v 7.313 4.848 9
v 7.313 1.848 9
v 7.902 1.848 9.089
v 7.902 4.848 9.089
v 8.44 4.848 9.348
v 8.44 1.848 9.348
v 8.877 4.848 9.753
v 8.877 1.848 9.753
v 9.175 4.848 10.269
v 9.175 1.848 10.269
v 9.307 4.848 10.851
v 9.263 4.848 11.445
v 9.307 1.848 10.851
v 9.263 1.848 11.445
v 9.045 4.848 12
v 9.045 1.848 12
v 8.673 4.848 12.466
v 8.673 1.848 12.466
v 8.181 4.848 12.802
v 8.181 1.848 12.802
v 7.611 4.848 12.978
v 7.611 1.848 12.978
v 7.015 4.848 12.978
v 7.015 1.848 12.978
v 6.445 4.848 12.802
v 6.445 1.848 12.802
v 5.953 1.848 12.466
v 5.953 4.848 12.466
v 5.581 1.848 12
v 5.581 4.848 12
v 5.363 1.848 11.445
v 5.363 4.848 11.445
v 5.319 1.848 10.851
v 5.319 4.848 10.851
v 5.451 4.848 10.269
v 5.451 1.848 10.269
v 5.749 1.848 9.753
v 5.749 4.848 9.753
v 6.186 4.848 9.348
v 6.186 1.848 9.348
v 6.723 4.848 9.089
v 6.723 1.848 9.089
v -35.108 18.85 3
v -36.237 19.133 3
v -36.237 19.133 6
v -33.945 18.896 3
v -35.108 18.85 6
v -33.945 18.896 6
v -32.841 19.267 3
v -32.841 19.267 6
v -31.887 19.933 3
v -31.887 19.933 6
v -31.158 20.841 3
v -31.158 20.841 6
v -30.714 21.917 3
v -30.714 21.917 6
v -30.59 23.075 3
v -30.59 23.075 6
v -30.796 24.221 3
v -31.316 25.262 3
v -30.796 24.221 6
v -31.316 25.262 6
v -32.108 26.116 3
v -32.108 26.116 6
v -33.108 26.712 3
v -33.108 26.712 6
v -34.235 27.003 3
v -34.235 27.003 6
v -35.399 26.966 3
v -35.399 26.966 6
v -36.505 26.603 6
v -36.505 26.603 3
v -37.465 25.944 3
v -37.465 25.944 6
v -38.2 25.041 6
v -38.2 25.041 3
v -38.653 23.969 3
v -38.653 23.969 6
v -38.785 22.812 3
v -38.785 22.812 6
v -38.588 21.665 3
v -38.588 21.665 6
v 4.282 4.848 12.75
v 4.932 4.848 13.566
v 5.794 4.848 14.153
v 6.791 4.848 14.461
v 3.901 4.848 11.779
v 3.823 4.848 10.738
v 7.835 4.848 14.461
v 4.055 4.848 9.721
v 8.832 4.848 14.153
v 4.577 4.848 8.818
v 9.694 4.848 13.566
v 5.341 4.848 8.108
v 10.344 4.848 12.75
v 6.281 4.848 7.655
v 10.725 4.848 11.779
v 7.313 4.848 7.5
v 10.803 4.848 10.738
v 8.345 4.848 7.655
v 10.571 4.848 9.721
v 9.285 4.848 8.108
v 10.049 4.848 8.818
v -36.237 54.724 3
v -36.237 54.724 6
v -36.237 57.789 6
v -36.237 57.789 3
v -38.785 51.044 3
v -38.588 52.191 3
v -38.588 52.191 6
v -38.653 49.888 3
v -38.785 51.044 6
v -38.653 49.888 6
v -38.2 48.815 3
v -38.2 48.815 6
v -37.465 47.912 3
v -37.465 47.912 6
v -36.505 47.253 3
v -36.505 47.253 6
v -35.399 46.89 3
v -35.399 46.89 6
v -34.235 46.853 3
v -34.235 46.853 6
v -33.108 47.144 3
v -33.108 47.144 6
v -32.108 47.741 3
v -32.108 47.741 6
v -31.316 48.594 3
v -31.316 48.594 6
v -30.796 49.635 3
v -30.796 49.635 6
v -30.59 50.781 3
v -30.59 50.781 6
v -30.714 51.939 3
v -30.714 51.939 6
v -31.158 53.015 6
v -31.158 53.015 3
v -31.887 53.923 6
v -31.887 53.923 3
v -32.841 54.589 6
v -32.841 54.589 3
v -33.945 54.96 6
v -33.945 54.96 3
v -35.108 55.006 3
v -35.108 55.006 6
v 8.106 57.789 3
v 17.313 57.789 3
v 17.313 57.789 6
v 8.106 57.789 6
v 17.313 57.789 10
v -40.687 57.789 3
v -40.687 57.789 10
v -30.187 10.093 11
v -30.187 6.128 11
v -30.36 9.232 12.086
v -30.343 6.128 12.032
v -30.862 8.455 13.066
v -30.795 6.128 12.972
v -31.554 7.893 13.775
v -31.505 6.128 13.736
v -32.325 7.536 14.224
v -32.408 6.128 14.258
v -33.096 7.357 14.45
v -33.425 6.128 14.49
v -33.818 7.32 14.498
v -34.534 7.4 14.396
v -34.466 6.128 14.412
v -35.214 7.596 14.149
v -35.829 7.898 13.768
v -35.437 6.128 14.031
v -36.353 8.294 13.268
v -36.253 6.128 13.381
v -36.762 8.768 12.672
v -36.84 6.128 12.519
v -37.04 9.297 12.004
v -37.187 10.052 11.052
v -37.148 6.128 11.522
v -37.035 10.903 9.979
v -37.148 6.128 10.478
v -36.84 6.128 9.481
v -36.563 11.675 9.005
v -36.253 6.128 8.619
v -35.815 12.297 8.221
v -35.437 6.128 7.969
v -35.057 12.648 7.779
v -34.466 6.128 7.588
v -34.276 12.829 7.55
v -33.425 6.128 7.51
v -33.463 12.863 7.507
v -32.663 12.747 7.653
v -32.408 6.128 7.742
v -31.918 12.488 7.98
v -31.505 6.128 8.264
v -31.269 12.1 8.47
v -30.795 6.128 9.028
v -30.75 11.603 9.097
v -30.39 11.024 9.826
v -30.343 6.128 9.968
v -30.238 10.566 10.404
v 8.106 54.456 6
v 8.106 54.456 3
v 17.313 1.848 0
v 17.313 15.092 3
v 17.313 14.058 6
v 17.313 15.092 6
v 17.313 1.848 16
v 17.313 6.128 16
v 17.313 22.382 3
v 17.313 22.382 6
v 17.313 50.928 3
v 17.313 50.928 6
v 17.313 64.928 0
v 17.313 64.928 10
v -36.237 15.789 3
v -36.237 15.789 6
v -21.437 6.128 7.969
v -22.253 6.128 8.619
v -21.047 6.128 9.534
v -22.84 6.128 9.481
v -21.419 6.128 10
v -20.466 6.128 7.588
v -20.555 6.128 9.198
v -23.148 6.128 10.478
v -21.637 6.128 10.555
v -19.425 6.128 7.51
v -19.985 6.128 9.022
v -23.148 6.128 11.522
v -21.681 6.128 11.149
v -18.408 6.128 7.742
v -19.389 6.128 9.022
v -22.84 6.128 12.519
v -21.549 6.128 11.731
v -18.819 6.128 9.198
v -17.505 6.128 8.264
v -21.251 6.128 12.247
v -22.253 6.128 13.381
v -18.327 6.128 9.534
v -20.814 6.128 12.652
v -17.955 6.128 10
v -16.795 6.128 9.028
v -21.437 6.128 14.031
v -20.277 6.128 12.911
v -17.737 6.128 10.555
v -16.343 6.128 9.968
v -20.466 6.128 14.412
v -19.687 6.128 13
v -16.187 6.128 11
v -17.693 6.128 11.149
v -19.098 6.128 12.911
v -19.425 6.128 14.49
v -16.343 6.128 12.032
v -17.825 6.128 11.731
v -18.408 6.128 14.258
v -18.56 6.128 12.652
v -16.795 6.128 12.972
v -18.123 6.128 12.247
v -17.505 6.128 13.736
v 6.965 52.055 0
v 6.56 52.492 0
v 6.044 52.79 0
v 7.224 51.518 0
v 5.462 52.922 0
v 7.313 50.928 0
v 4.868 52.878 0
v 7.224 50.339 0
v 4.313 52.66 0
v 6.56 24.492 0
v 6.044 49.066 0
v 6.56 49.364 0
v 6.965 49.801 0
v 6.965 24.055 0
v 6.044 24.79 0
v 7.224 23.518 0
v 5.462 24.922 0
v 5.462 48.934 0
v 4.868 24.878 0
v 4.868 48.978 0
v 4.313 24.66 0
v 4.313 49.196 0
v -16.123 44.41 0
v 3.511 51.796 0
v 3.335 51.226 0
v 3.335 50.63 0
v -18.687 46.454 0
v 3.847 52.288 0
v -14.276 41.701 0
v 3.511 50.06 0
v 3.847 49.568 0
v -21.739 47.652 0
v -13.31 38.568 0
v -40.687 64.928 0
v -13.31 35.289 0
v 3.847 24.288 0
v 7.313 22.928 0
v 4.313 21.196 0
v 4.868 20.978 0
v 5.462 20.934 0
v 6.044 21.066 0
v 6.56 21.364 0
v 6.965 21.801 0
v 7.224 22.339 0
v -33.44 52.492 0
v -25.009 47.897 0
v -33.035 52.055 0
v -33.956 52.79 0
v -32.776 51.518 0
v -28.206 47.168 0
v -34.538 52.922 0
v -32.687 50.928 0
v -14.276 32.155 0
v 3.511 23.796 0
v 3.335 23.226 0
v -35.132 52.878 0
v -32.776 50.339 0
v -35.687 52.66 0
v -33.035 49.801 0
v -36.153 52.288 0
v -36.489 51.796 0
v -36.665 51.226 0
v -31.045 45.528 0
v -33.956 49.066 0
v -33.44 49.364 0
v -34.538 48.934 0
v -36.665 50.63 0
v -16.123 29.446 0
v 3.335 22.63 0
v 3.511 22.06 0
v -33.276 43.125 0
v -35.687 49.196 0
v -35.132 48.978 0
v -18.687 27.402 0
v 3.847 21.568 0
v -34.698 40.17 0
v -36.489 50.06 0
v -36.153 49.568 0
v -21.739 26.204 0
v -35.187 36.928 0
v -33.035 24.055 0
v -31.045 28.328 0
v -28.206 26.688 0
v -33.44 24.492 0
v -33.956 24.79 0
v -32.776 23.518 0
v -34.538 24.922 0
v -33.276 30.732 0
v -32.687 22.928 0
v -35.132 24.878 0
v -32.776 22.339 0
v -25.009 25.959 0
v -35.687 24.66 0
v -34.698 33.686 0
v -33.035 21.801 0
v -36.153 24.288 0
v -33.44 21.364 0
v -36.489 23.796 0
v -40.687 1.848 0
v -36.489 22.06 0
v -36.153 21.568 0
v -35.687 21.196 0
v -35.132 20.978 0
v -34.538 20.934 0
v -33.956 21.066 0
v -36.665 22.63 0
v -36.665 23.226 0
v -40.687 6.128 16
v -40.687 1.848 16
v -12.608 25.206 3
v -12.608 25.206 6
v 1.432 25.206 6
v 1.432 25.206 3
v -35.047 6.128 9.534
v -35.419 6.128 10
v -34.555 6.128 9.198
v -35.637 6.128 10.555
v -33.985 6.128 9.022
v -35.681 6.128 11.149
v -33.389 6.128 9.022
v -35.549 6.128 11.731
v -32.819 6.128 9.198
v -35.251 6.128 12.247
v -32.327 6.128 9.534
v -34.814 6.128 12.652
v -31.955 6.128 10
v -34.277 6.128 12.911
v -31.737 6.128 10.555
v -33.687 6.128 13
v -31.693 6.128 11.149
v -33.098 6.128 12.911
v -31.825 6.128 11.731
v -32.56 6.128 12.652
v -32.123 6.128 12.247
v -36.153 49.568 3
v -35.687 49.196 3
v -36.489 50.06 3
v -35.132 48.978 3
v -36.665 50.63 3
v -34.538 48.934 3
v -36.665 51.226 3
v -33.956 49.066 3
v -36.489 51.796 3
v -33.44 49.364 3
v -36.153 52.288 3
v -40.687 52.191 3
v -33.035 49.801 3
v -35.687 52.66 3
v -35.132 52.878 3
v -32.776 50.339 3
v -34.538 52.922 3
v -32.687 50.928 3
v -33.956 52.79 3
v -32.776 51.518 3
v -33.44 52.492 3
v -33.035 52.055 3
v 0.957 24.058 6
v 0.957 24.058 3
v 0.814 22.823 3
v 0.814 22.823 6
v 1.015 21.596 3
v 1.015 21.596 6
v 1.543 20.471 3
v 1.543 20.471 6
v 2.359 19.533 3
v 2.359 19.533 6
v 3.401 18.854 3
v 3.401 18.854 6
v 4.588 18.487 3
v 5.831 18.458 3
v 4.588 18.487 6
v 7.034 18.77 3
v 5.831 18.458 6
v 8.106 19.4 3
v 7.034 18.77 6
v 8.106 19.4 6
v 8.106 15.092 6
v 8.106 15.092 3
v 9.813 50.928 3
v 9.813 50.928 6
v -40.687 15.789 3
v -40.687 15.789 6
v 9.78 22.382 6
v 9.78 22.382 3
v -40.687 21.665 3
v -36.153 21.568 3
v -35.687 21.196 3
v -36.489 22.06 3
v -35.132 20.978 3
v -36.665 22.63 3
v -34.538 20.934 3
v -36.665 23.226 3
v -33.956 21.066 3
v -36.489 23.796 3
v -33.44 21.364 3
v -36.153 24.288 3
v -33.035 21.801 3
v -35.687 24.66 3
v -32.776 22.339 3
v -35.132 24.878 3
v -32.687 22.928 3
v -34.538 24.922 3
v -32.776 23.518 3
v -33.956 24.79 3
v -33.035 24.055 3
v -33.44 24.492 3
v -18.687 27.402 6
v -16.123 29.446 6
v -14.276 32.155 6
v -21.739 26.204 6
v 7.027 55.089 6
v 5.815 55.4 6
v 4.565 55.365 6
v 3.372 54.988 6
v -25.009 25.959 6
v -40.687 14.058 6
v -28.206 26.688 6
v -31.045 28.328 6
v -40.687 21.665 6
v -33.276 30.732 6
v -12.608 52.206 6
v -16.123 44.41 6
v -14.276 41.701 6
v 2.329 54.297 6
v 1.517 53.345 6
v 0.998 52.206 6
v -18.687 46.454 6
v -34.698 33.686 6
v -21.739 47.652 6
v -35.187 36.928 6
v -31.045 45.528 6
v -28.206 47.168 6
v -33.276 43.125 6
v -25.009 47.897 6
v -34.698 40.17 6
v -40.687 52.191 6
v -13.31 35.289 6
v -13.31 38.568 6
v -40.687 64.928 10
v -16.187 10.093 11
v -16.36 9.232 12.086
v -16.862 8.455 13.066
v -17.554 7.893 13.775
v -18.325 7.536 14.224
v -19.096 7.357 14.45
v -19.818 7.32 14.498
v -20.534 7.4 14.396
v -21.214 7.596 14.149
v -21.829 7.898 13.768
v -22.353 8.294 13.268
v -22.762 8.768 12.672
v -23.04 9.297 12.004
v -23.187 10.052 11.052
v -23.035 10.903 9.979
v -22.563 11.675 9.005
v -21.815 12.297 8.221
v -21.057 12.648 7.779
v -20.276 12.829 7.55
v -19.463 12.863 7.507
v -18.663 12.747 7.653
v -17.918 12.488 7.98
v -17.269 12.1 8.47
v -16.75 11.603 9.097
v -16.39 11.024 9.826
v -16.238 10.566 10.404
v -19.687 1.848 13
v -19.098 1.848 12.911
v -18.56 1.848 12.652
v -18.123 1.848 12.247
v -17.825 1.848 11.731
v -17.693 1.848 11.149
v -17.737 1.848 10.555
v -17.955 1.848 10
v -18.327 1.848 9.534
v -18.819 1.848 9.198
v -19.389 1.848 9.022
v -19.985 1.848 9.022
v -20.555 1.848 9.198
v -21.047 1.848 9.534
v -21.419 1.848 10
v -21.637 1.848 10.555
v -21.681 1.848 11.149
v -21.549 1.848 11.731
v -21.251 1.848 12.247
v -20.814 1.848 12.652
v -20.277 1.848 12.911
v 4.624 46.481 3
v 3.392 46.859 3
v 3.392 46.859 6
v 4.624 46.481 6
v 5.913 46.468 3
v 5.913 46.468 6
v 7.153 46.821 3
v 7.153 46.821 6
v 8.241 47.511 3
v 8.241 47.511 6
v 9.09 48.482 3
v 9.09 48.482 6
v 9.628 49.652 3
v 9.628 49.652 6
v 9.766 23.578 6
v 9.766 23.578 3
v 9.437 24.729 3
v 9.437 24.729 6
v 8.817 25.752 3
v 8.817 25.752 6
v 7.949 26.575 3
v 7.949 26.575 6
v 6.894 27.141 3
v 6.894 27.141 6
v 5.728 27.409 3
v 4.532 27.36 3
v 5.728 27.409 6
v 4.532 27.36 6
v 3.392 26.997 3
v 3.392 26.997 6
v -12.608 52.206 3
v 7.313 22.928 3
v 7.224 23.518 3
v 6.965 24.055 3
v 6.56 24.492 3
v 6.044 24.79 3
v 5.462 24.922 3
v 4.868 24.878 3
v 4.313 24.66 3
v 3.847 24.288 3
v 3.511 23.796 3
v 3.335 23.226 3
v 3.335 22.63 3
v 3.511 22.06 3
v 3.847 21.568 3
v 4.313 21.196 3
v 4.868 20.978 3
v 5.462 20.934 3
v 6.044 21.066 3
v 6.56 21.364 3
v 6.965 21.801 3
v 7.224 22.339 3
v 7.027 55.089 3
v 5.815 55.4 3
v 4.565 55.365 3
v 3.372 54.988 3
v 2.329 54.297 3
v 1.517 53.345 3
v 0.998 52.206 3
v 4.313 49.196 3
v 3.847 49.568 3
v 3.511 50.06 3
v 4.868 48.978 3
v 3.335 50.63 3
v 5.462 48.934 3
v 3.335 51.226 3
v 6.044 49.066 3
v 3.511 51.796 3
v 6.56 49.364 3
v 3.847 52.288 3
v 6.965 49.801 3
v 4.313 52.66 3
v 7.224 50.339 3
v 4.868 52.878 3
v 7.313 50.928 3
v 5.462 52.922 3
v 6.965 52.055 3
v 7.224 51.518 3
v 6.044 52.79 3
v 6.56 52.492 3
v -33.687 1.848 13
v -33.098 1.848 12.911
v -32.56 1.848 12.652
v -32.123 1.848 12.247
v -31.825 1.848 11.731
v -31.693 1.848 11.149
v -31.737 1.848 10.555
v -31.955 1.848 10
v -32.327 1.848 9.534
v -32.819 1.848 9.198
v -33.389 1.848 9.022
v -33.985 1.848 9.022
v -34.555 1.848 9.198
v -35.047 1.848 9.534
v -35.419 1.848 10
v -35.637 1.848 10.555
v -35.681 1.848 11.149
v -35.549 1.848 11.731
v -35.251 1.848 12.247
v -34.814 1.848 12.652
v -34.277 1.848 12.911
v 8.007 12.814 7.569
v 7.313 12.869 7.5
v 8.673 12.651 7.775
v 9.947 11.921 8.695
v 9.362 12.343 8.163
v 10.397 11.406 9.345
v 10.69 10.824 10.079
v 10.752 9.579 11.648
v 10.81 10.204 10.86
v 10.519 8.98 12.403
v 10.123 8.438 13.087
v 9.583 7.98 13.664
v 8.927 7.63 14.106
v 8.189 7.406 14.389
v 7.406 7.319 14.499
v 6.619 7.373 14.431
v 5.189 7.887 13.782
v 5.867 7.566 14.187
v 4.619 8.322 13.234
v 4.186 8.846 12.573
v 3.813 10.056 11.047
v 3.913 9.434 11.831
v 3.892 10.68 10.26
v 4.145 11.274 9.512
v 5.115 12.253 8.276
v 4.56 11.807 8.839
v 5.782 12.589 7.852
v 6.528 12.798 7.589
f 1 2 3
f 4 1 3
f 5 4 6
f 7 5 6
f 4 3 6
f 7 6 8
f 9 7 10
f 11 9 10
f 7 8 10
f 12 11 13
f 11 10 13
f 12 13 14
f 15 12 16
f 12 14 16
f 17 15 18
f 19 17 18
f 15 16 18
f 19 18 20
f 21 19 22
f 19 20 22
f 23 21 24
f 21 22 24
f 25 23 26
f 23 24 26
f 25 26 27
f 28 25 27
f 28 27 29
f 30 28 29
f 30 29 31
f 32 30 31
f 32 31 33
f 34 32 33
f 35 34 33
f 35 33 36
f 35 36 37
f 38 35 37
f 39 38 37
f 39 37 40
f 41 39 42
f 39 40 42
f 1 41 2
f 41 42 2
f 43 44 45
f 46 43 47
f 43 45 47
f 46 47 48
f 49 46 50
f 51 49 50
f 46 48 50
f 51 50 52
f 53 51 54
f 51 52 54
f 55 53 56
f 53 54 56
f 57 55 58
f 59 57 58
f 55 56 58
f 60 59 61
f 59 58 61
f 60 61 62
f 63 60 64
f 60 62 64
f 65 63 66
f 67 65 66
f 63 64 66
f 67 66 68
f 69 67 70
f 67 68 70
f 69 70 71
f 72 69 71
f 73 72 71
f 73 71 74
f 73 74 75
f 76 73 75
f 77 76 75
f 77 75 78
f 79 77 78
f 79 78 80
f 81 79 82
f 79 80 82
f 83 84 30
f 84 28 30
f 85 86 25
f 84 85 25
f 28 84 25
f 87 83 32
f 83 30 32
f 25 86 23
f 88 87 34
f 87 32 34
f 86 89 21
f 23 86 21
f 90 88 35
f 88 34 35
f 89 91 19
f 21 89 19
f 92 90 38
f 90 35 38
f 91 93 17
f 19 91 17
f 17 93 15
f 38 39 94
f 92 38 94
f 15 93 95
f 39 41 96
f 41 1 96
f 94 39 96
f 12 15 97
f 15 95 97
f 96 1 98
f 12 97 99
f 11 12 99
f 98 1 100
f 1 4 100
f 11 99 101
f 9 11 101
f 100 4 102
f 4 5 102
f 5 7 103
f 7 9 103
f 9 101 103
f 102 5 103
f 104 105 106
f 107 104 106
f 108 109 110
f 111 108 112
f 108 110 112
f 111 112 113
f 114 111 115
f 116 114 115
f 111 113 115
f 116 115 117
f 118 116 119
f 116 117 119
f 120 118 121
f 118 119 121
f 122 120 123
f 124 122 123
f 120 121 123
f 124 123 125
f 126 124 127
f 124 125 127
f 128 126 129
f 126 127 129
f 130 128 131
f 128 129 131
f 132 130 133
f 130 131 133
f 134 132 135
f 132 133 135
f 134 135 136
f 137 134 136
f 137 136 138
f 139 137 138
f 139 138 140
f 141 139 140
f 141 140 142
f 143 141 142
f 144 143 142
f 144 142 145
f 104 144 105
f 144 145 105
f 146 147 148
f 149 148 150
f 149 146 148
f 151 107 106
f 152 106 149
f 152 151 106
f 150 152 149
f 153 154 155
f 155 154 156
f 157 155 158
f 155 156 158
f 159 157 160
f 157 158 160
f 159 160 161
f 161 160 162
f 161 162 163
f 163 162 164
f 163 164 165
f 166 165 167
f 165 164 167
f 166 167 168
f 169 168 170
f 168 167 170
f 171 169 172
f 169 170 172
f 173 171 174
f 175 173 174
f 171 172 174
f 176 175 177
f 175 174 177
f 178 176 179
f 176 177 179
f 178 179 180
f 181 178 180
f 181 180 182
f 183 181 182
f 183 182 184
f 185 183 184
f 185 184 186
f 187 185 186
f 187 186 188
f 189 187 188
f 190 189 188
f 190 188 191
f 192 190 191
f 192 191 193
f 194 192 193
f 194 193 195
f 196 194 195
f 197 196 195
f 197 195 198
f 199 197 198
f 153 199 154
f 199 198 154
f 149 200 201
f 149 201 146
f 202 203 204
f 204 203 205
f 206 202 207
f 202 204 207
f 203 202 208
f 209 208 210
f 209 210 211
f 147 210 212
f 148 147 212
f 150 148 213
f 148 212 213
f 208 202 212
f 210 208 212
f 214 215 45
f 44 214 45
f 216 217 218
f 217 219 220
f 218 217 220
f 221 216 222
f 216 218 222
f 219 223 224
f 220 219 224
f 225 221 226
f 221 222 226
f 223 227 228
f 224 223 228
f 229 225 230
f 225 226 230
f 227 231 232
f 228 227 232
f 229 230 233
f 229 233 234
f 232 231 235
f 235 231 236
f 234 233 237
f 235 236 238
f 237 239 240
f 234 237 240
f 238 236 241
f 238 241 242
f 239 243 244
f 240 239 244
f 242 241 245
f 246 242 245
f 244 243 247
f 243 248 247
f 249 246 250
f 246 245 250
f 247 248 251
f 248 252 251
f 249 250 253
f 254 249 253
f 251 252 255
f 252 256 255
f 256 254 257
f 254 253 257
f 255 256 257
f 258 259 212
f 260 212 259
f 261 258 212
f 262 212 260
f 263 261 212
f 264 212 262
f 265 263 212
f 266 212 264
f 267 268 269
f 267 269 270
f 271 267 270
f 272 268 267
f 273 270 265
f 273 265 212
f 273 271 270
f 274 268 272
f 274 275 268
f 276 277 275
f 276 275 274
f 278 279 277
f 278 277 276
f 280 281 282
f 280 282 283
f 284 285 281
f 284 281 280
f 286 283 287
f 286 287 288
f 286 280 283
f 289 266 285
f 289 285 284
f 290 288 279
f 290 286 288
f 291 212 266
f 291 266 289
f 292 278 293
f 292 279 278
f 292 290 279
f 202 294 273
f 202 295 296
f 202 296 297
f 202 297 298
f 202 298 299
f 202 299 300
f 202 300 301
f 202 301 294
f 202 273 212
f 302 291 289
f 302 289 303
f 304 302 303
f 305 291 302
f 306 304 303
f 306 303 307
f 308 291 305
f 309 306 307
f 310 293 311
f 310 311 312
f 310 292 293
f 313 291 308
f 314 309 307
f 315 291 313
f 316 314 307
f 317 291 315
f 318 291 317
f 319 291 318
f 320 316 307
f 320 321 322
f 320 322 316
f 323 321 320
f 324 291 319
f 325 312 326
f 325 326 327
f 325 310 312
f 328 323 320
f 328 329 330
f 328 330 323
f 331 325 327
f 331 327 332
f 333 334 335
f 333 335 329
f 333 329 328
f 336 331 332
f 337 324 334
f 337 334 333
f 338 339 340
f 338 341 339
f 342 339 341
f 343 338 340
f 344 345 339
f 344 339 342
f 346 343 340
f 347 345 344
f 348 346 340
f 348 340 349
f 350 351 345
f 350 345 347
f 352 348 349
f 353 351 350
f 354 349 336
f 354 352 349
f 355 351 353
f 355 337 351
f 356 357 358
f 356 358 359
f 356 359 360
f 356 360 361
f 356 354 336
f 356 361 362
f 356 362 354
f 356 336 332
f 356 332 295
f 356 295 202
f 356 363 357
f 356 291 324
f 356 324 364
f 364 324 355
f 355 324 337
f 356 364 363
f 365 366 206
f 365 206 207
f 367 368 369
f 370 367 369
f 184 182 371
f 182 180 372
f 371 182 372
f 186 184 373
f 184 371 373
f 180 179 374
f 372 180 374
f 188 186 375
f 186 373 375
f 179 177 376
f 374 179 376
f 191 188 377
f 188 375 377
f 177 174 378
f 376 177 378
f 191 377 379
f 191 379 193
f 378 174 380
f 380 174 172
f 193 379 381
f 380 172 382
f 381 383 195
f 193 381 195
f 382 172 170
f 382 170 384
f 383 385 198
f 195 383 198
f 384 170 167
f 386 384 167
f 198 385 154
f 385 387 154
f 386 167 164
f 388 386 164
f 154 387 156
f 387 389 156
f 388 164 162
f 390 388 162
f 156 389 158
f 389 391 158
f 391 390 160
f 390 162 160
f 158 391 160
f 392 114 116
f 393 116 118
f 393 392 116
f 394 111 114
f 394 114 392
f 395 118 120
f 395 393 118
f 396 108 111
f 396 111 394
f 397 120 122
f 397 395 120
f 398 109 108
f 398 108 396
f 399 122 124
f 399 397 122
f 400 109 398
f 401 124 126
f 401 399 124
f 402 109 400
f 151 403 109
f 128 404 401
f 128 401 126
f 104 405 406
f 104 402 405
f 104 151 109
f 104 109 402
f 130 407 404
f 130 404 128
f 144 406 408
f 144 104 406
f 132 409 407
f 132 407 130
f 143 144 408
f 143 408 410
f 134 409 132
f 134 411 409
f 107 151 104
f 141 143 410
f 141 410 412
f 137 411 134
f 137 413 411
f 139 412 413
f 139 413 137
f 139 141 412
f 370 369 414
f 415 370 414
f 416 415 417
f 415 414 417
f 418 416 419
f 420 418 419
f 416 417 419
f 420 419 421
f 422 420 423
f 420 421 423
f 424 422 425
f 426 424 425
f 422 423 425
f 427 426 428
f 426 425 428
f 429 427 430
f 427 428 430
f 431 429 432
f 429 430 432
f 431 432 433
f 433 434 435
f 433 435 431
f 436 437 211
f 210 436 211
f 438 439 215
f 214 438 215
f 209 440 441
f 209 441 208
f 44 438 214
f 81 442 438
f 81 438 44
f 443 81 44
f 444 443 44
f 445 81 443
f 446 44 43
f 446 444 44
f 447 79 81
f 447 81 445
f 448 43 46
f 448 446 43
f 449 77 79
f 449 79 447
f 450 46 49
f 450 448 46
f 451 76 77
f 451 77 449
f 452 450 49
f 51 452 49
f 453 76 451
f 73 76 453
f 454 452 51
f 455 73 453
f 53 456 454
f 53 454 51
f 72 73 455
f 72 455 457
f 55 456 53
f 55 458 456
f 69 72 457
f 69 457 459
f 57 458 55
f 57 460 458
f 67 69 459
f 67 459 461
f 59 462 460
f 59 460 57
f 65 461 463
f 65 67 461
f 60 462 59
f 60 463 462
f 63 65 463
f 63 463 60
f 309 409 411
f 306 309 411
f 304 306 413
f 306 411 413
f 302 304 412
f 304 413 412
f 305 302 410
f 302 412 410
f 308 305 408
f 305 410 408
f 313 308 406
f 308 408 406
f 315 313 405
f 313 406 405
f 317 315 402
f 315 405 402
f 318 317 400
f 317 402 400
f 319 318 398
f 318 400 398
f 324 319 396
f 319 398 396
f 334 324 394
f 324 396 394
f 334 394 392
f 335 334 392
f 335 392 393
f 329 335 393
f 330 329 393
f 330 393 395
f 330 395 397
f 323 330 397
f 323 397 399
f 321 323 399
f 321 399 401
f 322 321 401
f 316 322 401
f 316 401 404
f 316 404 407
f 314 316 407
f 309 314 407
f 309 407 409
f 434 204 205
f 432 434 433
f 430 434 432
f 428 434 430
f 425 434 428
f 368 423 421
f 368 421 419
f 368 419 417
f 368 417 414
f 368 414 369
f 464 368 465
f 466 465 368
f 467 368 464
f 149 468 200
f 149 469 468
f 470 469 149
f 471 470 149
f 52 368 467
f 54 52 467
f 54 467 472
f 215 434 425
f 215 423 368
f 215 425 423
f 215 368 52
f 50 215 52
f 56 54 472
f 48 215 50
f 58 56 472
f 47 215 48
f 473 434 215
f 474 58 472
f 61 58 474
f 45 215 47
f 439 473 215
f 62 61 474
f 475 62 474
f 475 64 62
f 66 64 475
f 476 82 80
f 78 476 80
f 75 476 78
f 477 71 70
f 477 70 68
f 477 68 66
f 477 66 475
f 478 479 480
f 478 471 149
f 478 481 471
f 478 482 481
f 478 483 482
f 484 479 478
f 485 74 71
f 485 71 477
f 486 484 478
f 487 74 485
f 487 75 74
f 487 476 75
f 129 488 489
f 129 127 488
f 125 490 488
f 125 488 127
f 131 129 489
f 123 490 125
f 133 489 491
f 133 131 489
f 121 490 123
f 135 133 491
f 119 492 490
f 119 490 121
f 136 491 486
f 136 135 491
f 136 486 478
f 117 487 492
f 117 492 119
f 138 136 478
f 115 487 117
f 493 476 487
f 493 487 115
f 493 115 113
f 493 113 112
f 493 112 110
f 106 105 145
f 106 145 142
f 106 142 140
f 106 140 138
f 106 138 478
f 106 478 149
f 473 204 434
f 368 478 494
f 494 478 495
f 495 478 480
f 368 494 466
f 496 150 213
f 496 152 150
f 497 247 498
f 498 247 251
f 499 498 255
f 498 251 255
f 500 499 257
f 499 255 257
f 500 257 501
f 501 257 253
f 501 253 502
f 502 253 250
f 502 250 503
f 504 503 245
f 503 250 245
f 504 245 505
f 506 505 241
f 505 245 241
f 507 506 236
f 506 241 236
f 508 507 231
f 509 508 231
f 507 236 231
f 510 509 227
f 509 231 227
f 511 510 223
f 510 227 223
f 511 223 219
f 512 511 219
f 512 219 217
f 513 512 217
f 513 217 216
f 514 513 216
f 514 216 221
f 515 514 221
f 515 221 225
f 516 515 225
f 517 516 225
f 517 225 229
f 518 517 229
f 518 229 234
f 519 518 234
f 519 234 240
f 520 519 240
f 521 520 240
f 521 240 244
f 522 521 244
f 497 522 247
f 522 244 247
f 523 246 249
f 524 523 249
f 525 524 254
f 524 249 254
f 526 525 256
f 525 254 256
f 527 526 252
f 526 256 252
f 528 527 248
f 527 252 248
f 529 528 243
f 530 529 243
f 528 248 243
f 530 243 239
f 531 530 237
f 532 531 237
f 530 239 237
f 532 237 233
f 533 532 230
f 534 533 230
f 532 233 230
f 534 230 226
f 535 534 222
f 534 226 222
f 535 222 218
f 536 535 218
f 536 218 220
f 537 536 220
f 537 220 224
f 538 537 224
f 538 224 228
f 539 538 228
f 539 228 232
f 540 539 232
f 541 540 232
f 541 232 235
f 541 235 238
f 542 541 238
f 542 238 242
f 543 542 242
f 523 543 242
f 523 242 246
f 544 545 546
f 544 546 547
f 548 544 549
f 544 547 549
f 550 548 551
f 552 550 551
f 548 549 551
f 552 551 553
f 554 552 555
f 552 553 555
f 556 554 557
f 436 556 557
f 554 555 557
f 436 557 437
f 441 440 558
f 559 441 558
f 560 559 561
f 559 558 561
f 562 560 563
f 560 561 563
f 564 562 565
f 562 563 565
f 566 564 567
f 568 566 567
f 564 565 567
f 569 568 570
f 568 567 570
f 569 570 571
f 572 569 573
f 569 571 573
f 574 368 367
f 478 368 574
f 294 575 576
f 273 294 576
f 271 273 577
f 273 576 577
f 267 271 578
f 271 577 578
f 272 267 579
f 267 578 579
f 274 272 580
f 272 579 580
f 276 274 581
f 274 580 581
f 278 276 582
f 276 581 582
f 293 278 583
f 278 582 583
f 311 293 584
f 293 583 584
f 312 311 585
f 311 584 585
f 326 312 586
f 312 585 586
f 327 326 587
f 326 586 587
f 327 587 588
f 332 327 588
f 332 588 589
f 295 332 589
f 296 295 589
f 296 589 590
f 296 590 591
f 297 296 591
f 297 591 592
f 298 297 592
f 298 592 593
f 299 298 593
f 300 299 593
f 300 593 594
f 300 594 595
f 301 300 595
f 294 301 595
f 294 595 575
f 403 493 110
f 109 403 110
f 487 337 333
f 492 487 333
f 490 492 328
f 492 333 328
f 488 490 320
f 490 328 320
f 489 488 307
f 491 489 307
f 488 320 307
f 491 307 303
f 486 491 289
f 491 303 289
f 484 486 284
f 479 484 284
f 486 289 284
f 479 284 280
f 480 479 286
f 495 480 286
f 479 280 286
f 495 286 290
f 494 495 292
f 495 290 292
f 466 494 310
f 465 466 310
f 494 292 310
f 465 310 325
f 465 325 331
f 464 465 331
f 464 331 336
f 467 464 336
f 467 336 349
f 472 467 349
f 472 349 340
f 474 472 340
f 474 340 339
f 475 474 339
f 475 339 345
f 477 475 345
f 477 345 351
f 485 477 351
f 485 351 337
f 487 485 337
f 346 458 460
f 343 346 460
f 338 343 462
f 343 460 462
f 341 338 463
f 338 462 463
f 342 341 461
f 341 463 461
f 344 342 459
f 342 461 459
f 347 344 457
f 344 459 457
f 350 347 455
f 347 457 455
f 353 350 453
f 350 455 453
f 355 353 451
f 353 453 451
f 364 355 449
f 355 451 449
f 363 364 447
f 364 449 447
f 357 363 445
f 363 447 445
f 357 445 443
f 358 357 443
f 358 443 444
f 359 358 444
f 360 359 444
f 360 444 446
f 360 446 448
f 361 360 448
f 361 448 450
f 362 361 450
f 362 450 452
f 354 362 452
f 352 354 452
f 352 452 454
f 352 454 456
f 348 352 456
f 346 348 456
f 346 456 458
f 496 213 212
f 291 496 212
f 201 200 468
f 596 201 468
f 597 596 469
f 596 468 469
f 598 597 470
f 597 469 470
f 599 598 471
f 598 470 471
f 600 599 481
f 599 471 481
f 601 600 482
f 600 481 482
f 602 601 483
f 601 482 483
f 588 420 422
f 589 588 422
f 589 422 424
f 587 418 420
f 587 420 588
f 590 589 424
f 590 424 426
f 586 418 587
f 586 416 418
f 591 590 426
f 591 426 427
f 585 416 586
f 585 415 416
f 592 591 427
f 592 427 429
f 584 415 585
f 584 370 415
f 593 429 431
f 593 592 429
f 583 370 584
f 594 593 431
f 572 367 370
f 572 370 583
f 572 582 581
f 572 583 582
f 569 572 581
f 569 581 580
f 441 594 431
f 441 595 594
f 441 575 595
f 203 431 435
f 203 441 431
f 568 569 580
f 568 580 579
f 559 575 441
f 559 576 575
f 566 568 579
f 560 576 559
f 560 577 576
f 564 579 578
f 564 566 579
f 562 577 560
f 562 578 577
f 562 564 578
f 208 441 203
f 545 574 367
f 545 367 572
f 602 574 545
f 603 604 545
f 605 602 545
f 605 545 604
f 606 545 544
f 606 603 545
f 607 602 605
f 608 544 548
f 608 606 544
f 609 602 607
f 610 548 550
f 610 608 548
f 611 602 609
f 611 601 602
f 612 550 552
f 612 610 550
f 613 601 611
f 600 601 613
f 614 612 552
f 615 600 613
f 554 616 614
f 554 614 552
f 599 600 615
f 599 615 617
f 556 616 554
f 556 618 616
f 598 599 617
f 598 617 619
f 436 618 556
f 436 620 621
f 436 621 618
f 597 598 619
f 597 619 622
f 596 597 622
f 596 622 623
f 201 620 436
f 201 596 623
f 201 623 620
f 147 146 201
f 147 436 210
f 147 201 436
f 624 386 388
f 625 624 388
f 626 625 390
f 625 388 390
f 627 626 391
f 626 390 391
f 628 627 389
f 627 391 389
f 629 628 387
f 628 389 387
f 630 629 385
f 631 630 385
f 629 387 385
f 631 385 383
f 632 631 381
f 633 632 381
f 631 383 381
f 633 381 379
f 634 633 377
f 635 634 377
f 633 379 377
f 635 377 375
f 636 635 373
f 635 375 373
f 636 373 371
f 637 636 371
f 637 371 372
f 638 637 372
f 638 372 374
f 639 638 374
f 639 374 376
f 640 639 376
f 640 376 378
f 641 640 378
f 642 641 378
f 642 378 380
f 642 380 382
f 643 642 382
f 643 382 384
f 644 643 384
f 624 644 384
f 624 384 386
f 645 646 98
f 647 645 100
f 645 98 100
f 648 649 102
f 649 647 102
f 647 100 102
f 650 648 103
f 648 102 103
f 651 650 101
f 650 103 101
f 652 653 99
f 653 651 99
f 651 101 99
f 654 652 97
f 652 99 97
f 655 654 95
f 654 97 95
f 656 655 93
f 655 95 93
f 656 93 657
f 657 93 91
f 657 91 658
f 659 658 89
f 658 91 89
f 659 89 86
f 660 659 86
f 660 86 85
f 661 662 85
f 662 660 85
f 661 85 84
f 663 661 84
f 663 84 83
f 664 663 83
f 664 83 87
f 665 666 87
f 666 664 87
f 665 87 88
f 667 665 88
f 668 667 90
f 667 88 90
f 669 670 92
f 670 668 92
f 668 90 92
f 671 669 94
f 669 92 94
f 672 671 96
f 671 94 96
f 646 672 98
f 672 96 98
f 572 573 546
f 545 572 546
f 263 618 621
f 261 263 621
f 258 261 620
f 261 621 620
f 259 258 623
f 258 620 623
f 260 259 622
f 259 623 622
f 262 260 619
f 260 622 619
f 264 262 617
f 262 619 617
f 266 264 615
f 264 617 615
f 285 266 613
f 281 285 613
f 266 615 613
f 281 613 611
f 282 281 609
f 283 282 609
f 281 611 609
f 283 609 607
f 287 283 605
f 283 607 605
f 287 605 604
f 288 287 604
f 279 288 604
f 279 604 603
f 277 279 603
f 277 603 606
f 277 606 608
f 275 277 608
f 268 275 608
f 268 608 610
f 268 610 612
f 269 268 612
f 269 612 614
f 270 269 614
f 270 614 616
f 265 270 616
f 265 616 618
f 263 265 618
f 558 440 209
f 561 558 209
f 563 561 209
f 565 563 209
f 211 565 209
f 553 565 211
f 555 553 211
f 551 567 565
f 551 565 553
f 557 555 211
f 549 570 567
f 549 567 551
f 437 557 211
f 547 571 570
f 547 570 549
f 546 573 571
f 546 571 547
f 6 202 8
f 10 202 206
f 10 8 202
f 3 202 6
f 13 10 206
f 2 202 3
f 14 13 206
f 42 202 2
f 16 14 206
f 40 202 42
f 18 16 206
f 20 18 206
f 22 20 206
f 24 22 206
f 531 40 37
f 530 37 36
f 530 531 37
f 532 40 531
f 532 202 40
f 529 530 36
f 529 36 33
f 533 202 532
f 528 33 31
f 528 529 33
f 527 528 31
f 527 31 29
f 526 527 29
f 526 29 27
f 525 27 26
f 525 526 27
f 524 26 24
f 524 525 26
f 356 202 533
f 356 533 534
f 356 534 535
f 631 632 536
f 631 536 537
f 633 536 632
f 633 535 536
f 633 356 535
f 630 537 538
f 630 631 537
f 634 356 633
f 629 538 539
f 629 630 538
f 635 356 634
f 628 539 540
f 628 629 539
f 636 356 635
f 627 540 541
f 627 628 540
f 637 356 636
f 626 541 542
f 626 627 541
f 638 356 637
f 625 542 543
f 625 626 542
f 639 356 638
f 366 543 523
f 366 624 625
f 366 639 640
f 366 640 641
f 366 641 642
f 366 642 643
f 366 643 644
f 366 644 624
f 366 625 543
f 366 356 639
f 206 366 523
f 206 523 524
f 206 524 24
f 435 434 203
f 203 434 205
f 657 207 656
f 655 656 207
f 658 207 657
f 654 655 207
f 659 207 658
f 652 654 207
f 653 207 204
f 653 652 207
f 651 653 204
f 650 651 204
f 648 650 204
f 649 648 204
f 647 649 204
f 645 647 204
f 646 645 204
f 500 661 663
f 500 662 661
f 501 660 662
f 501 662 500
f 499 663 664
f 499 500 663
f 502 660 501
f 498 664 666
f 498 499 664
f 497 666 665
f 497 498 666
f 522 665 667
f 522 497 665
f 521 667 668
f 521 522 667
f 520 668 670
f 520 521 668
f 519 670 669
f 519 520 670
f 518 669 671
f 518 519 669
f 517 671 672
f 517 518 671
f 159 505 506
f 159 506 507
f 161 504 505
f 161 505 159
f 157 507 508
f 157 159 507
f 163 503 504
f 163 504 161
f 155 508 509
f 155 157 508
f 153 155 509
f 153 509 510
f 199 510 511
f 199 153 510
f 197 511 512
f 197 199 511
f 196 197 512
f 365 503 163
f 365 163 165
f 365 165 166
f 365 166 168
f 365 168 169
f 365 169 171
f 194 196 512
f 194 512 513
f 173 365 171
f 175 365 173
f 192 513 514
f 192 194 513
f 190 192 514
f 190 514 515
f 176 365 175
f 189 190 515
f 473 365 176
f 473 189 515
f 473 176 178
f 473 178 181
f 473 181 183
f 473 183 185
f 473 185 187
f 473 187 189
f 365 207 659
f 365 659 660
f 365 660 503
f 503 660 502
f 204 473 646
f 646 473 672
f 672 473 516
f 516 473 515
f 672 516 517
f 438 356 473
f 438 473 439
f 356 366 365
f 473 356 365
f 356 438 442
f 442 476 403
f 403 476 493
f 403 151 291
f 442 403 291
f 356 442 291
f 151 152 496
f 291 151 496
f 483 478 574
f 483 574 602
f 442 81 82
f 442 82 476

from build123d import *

# Parameters (mm, degrees)
SKETCH1_W            = 93
SKETCH1_H            = 100
BOSS_EXTRUDE2_DEPTH  = 10
SKETCH4_W            = 10.01
SKETCH4_H            = 15
BOSS_EXTRUDE4_DEPTH  = 24
SKETCH5_R            = 2
CUT_EXTRUDE1_DEPTH   = 50
SKETCH7_R            = 11
CUT_EXTRUDE3_DEPTH   = 50
SKETCH14_W           = 61.5
SKETCH14_H           = 42
CUT_EXTRUDE8_DEPTH   = 4
SKETCH19_R           = 11
CUT_EXTRUDE11_DEPTH  = 15
SKETCH20_R           = 2
CUT_EXTRUDE12_DEPTH  = 10
SKETCH21_W           = 40
SKETCH21_H           = 6
BOSS_EXTRUDE5_DEPTH  = 27
SKETCH22_W           = 40
SKETCH22_H           = 6.3
BOSS_EXTRUDE7_DEPTH  = 40
SKETCH23_R           = 8
CUT_EXTRUDE13_DEPTH  = 40
SKETCH24_W           = 118.277817783
SKETCH24_H           = 41.8
CUT_EXTRUDE14_DEPTH  = 40
SKETCH25_W           = 31.5
SKETCH25_H           = 23.2
CUT_EXTRUDE15_DEPTH  = 20
CUT_EXTRUDE18_DEPTH  = 3
SKETCH27_R           = 4.1
SKETCH27_R_2         = 4
CUT_EXTRUDE29_DEPTH  = 3
SKETCH28_W           = 29.5
SKETCH28_H           = 58.2
CUT_EXTRUDE30_DEPTH  = 23
SKETCH29_W           = 32
SKETCH29_H           = 4
CUT_EXTRUDE31_DEPTH  = 23
SKETCH31_W           = 32
SKETCH31_H           = 6
BOSS_EXTRUDE9_DEPTH  = 6.6
SKETCH32_W           = 32
SKETCH32_H           = 6
BOSS_EXTRUDE10_DEPTH = 10
SKETCH33_R           = 2
CUT_EXTRUDE32_DEPTH  = 10
BOSS_EXTRUDE11_START = -32
BOSS_EXTRUDE11_DEPTH = 32
SKETCH35_R           = 3.5
CUT_EXTRUDE33_DEPTH  = 10
SKETCH36_W           = 27
SKETCH36_H           = 46
CUT_EXTRUDE34_DEPTH  = 50
SKETCH38_W           = 31.75
SKETCH38_H           = 35
CUT_EXTRUDE35_DEPTH  = 50
SKETCH40_W           = 4
SKETCH40_H           = 77.818306413
CUT_EXTRUDE37_DEPTH  = 110
SKETCH41_W           = 28
SKETCH41_H           = 1.72
CUT_EXTRUDE38_DEPTH  = 50
BOSS_EXTRUDE12_DEPTH = 30
SKETCH43_R           = 2
CUT_EXTRUDE39_DEPTH  = 30
SKETCH44_R           = 4.5
CUT_EXTRUDE40_DEPTH  = 3
SKETCH45_W           = 9.206702729
SKETCH45_H           = 6.861074725
SKETCH45_H_2         = 7.289433521
CUT_EXTRUDE41_DEPTH  = 3
SKETCH46_W           = 16
SKETCH46_H           = 27
CUT_EXTRUDE42_DEPTH  = 3
SKETCH47_R           = 2
CUT_EXTRUDE43_DEPTH  = 3
SKETCH48_R           = 3.5
CUT_EXTRUDE44_DEPTH  = 23


with BuildPart() as part:
    # Sketch1 → Boss-Extrude2 (new body)
    with BuildSketch(Plane.XY):
        with Locations((-29.68705036, 14.928057554)):
            Rectangle(SKETCH1_W, SKETCH1_H)
    extrude(amount=BOSS_EXTRUDE2_DEPTH)

    # Sketch4 → Boss-Extrude4 (add)
    with BuildSketch(Plane(origin=(16.81294964, 0, 0), x_dir=(0, 0, -1), z_dir=(1, 0, 0))):
        with Locations((-4.995, -12.571942446)):
            Rectangle(SKETCH4_W, SKETCH4_H)
    extrude(amount=BOSS_EXTRUDE4_DEPTH)

    # Sketch5 → Cut-Extrude1 (cut)
    with BuildSketch(Plane(origin=(0, -5.071942446, 0), x_dir=(1, 0, 0), z_dir=(0, 1, 0))):
        with Locations(Location((26.81294964, -5, 0), (0, 0, 180))):
            Circle(SKETCH5_R)
    extrude(amount=-CUT_EXTRUDE1_DEPTH, mode=Mode.SUBTRACT)

    # Sketch7 → Cut-Extrude3 (cut)
    with BuildSketch(Plane(origin=(0, 0, 0), x_dir=(-1, 0, 0), z_dir=(0, 0, -1))):
        with Locations((24.18705036, 36.928057554)):
            Circle(SKETCH7_R)
    extrude(amount=-CUT_EXTRUDE3_DEPTH, mode=Mode.SUBTRACT)

    # Sketch14 → Cut-Extrude8 (cut)
    with BuildSketch(Plane.XY.offset(10)):
        with Locations((-13.93705036, 36.789132279)):
            Rectangle(SKETCH14_W, SKETCH14_H)
    extrude(amount=-CUT_EXTRUDE8_DEPTH, mode=Mode.SUBTRACT)

    # Sketch19 → Cut-Extrude11 (cut)
    with BuildSketch(Plane(origin=(0, 0, 0), x_dir=(-1, 0, 0), z_dir=(0, 0, -1))):
        with Locations((53.18705036, 36.928057554)):
            Circle(SKETCH19_R)
    extrude(amount=-CUT_EXTRUDE11_DEPTH, mode=Mode.SUBTRACT)

    # Sketch20 → Cut-Extrude12 (cut)
    with BuildSketch(Plane.XY.offset(6)):
        with Locations((-34.68705036, 50.928057554)):
            Circle(SKETCH20_R)
        with Locations((5.31294964, 50.928057554)):
            Circle(SKETCH20_R)
        with Locations((-34.68705036, 22.928057554)):
            Circle(SKETCH20_R)
        with Locations((5.31294964, 22.928057554)):
            Circle(SKETCH20_R)
    extrude(amount=-CUT_EXTRUDE12_DEPTH, mode=Mode.SUBTRACT)

    # Sketch21 → Boss-Extrude5 (add)
    with BuildSketch(Plane(origin=(0, 0, 0), x_dir=(-1, 0, 0), z_dir=(0, 0, -1))):
        with Locations((56.18705036, 61.928057554)):
            Rectangle(SKETCH21_W, SKETCH21_H)
    extrude(amount=BOSS_EXTRUDE5_DEPTH)

    # Sketch22 → Boss-Extrude7 (add)
    with BuildSketch(Plane.XZ.offset(-58.928057554)):
        with Locations((-56.18705036, -23.85)):
            Rectangle(SKETCH22_W, SKETCH22_H)
    extrude(amount=BOSS_EXTRUDE7_DEPTH)

    # Sketch23 → Cut-Extrude13 (cut)
    with BuildSketch(Plane.XY.offset(10)):
        with Locations((-53.18705036, 36.928057554)):
            Circle(SKETCH23_R)
    extrude(amount=-CUT_EXTRUDE13_DEPTH, mode=Mode.SUBTRACT)

    # Sketch24 → Cut-Extrude14 (cut)
    with BuildSketch(Plane.XY.offset(10)):
        with Locations((-17.048141468, -14.171942446)):
            Rectangle(SKETCH24_W, SKETCH24_H)
    extrude(amount=-CUT_EXTRUDE14_DEPTH, mode=Mode.SUBTRACT)

    # Sketch25 → Cut-Extrude15 (cut)
    with BuildSketch(Plane.XY.offset(10)):
        with Locations((-60.43705036, 18.328057554)):
            Rectangle(SKETCH25_W, SKETCH25_H)
    extrude(amount=-CUT_EXTRUDE15_DEPTH, mode=Mode.SUBTRACT)

    # Sketch26 → Cut-Extrude18 (cut)
    with BuildSketch(Plane.XY.offset(6)):
        with BuildLine():
            Line((14.30212304, 57.789132279), (6.863398886, 57.789132279))
            Line((6.863398886, 57.789132279), (6.863398886, 54.615347499))
            ThreePointArc((6.863398886, 54.615347499), (8.24773413, 53.645968516), (9.108195728, 52.191428892))
            Line((9.108195728, 52.191428892), (14.30212304, 52.191428892))
            Line((14.30212304, 52.191428892), (14.30212304, 57.789132279))
        make_face()
        with BuildLine():
            Line((6.863398886, 19.240767609), (6.863398886, 15.789132279))
            Line((6.863398886, 15.789132279), (14.30212304, 15.789132279))
            Line((14.30212304, 15.789132279), (14.30212304, 20.928057554))
            Line((14.30212304, 20.928057554), (8.777051255, 20.928057554))
            ThreePointArc((8.777051255, 20.928057554), (7.95835451, 19.927752057), (6.863398886, 19.240767609))
        make_face()
        with BuildLine():
            Line((-36.237499605, 57.789132279), (-44.68705036, 57.789132279))
            Line((-44.68705036, 57.789132279), (-44.68705036, 52.191428892))
            Line((-44.68705036, 52.191428892), (-38.482296447, 52.191428892))
            ThreePointArc((-38.482296447, 52.191428892), (-37.621834849, 53.645968516), (-36.237499605, 54.615347499))
            Line((-36.237499605, 54.615347499), (-36.237499605, 57.789132279))
        make_face()
        with BuildLine():
            Line((-44.68705036, 21.664686216), (-44.68705036, 15.789132279))
            Line((-44.68705036, 15.789132279), (-36.237499605, 15.789132279))
            Line((-36.237499605, 15.789132279), (-36.237499605, 19.240767609))
            ThreePointArc((-36.237499605, 19.240767609), (-37.621834849, 20.210146592), (-38.482296447, 21.664686216))
            Line((-38.482296447, 21.664686216), (-44.68705036, 21.664686216))
        make_face()
    extrude(amount=-CUT_EXTRUDE18_DEPTH, mode=Mode.SUBTRACT)

    # Sketch27 → Cut-Extrude29 (cut)
    with BuildSketch(Plane.XY.offset(6)):
        with Locations((5.31294964, 50.928057554)):
            Circle(SKETCH27_R)
        with Locations((5.31294964, 22.928057554)):
            Circle(SKETCH27_R_2)
        with Locations((-34.68705036, 50.928057554)):
            Circle(SKETCH27_R)
        with Locations((-34.68705036, 22.928057554)):
            Circle(SKETCH27_R)
    extrude(amount=-CUT_EXTRUDE29_DEPTH, mode=Mode.SUBTRACT)

    # Sketch28 → Cut-Extrude30 (cut)
    with BuildSketch(Plane(origin=(0, 0, 0), x_dir=(-1, 0, 0), z_dir=(0, 0, -1))):
        with Locations((-2.06294964, 35.828057554)):
            Rectangle(SKETCH28_W, SKETCH28_H)
    extrude(amount=-CUT_EXTRUDE30_DEPTH, mode=Mode.SUBTRACT)

    # Sketch29 → Cut-Extrude31 (cut)
    with BuildSketch(Plane(origin=(0, 15.789132279, 0), x_dir=(1, 0, 0), z_dir=(0, 1, 0))):
        with Locations((-28.68705036, -8)):
            Rectangle(SKETCH29_W, SKETCH29_H)
    extrude(amount=-CUT_EXTRUDE31_DEPTH, mode=Mode.SUBTRACT)

    # Sketch31 → Boss-Extrude9 (add)
    with BuildSketch(Plane.XZ.offset(-6.728057554)):
        with Locations((-28.68705036, 3)):
            Rectangle(SKETCH31_W, SKETCH31_H)
    extrude(amount=BOSS_EXTRUDE9_DEPTH)

    # Sketch32 → Boss-Extrude10 (add)
    with BuildSketch(Plane.XY.offset(6)):
        with Locations((-28.68705036, 3.128057554)):
            Rectangle(SKETCH32_W, SKETCH32_H)
    extrude(amount=BOSS_EXTRUDE10_DEPTH)

    # Sketch33 → Cut-Extrude32 (cut)
    with BuildSketch(Plane(origin=(0, 6.128057554, 0), x_dir=(1, 0, 0), z_dir=(0, 1, 0))):
        with Locations(Location((-33.68705036, -11, 0), (0, 0, 270))):
            Circle(SKETCH33_R)
        with Locations(Location((-19.68705036, -11, 0), (0, 0, 270))):
            Circle(SKETCH33_R)
    extrude(amount=-CUT_EXTRUDE32_DEPTH, mode=Mode.SUBTRACT)

    # Sketch34 → Boss-Extrude11 (add)
    with BuildSketch(Plane(origin=(-12.68705036, 0, 0), x_dir=(0, 0, -1), z_dir=(1, 0, 0)).offset(BOSS_EXTRUDE11_START)):
        Polygon((-16, 6.128057554), (-6, 6.128057554), (-6, 14.058360342), align=None)
    extrude(amount=BOSS_EXTRUDE11_DEPTH)

    # Sketch35 → Cut-Extrude33 (cut)
    with BuildSketch(Plane.XZ.offset(-6.128057554)):
        with Locations((-19.68705036, 11)):
            Circle(SKETCH35_R)
        with Locations((-33.68705036, 11)):
            Circle(SKETCH35_R)
    extrude(amount=-CUT_EXTRUDE33_DEPTH, mode=Mode.SUBTRACT)

    # Sketch36 → Cut-Extrude34 (cut)
    with BuildSketch(Plane(origin=(-36.18705036, 0, 0), x_dir=(0, 0, -1), z_dir=(1, 0, 0))):
        with Locations((13.5, 41.928057554)):
            Rectangle(SKETCH36_W, SKETCH36_H)
    extrude(amount=-CUT_EXTRUDE34_DEPTH, mode=Mode.SUBTRACT)

    # Sketch38 → Cut-Extrude35 (cut)
    with BuildSketch(Plane.XY.offset(10)):
        with Locations((-60.31205036, 47.428057554)):
            Rectangle(SKETCH38_W, SKETCH38_H)
    extrude(amount=-CUT_EXTRUDE35_DEPTH, mode=Mode.SUBTRACT)

    # Sketch40 → Cut-Extrude37 (cut)
    with BuildSketch(Plane.XY.offset(16)):
        with Locations((-42.68705036, 39.037210761)):
            Rectangle(SKETCH40_W, SKETCH40_H)
    extrude(amount=-CUT_EXTRUDE37_DEPTH, mode=Mode.SUBTRACT)

    # Sketch41 → Cut-Extrude38 (cut)
    with BuildSketch(Plane.XY.offset(16)):
        with Locations((-26.68705036, 0.988057554)):
            Rectangle(SKETCH41_W, SKETCH41_H)
    extrude(amount=-CUT_EXTRUDE38_DEPTH, mode=Mode.SUBTRACT)

    # Sketch42 → Boss-Extrude12 (add)
    with BuildSketch(Plane(origin=(-12.68705036, 0, 0), x_dir=(0, 0, -1), z_dir=(1, 0, 0))):
        Polygon((-10, 64.928057554), (0, 64.928057554), (0, 1.848057554), (-16, 1.848057554), (-16, 6.128057554), (-6, 14.058360342), (-6, 57.789132279), (-10, 57.789132279), align=None)
    extrude(amount=BOSS_EXTRUDE12_DEPTH)

    # Sketch43 → Cut-Extrude39 (cut)
    with BuildSketch(Plane.XY.offset(6)):
        with Locations((5.31294964, 50.928057554)):
            Circle(SKETCH43_R)
        with Locations((5.31294964, 22.928057554)):
            Circle(SKETCH43_R)
    extrude(amount=-CUT_EXTRUDE39_DEPTH, mode=Mode.SUBTRACT)

    # Sketch44 → Cut-Extrude40 (cut)
    with BuildSketch(Plane.XY.offset(6)):
        with Locations((5.31294964, 22.928057554)):
            Circle(SKETCH44_R)
        with Locations((5.31294964, 50.928057554)):
            Circle(SKETCH44_R)
    extrude(amount=-CUT_EXTRUDE40_DEPTH, mode=Mode.SUBTRACT)

    # Sketch45 → Cut-Extrude41 (cut)
    with BuildSketch(Plane.XY.offset(6)):
        with Locations((12.709598275, 54.358594917)):
            Rectangle(SKETCH45_W, SKETCH45_H)
        with Locations((12.709598275, 18.736953601)):
            Rectangle(SKETCH45_W, SKETCH45_H_2)
    extrude(amount=-CUT_EXTRUDE41_DEPTH, mode=Mode.SUBTRACT)

    # Sketch46 → Cut-Extrude42 (cut)
    with BuildSketch(Plane.XY.offset(6)):
        with Locations((-4.607936524, 38.706325488)):
            Rectangle(SKETCH46_W, SKETCH46_H)
    extrude(amount=-CUT_EXTRUDE42_DEPTH, mode=Mode.SUBTRACT)

    # Sketch47 → Cut-Extrude43 (cut)
    with BuildSketch(Plane.XZ.offset(-1.848057554)):
        with Locations(Location((7.31294964, 11, 0), (0, 0, 270))):
            Circle(SKETCH47_R)
    extrude(amount=-CUT_EXTRUDE43_DEPTH, mode=Mode.SUBTRACT)

    # Sketch48 → Cut-Extrude44 (cut)
    with BuildSketch(Plane.XZ.offset(-4.848057554)):
        with Locations(Location((7.31294964, 11, 0), (0, 0, 270))):
            Circle(SKETCH48_R)
    extrude(amount=-CUT_EXTRUDE44_DEPTH, mode=Mode.SUBTRACT)


solid = part.part
